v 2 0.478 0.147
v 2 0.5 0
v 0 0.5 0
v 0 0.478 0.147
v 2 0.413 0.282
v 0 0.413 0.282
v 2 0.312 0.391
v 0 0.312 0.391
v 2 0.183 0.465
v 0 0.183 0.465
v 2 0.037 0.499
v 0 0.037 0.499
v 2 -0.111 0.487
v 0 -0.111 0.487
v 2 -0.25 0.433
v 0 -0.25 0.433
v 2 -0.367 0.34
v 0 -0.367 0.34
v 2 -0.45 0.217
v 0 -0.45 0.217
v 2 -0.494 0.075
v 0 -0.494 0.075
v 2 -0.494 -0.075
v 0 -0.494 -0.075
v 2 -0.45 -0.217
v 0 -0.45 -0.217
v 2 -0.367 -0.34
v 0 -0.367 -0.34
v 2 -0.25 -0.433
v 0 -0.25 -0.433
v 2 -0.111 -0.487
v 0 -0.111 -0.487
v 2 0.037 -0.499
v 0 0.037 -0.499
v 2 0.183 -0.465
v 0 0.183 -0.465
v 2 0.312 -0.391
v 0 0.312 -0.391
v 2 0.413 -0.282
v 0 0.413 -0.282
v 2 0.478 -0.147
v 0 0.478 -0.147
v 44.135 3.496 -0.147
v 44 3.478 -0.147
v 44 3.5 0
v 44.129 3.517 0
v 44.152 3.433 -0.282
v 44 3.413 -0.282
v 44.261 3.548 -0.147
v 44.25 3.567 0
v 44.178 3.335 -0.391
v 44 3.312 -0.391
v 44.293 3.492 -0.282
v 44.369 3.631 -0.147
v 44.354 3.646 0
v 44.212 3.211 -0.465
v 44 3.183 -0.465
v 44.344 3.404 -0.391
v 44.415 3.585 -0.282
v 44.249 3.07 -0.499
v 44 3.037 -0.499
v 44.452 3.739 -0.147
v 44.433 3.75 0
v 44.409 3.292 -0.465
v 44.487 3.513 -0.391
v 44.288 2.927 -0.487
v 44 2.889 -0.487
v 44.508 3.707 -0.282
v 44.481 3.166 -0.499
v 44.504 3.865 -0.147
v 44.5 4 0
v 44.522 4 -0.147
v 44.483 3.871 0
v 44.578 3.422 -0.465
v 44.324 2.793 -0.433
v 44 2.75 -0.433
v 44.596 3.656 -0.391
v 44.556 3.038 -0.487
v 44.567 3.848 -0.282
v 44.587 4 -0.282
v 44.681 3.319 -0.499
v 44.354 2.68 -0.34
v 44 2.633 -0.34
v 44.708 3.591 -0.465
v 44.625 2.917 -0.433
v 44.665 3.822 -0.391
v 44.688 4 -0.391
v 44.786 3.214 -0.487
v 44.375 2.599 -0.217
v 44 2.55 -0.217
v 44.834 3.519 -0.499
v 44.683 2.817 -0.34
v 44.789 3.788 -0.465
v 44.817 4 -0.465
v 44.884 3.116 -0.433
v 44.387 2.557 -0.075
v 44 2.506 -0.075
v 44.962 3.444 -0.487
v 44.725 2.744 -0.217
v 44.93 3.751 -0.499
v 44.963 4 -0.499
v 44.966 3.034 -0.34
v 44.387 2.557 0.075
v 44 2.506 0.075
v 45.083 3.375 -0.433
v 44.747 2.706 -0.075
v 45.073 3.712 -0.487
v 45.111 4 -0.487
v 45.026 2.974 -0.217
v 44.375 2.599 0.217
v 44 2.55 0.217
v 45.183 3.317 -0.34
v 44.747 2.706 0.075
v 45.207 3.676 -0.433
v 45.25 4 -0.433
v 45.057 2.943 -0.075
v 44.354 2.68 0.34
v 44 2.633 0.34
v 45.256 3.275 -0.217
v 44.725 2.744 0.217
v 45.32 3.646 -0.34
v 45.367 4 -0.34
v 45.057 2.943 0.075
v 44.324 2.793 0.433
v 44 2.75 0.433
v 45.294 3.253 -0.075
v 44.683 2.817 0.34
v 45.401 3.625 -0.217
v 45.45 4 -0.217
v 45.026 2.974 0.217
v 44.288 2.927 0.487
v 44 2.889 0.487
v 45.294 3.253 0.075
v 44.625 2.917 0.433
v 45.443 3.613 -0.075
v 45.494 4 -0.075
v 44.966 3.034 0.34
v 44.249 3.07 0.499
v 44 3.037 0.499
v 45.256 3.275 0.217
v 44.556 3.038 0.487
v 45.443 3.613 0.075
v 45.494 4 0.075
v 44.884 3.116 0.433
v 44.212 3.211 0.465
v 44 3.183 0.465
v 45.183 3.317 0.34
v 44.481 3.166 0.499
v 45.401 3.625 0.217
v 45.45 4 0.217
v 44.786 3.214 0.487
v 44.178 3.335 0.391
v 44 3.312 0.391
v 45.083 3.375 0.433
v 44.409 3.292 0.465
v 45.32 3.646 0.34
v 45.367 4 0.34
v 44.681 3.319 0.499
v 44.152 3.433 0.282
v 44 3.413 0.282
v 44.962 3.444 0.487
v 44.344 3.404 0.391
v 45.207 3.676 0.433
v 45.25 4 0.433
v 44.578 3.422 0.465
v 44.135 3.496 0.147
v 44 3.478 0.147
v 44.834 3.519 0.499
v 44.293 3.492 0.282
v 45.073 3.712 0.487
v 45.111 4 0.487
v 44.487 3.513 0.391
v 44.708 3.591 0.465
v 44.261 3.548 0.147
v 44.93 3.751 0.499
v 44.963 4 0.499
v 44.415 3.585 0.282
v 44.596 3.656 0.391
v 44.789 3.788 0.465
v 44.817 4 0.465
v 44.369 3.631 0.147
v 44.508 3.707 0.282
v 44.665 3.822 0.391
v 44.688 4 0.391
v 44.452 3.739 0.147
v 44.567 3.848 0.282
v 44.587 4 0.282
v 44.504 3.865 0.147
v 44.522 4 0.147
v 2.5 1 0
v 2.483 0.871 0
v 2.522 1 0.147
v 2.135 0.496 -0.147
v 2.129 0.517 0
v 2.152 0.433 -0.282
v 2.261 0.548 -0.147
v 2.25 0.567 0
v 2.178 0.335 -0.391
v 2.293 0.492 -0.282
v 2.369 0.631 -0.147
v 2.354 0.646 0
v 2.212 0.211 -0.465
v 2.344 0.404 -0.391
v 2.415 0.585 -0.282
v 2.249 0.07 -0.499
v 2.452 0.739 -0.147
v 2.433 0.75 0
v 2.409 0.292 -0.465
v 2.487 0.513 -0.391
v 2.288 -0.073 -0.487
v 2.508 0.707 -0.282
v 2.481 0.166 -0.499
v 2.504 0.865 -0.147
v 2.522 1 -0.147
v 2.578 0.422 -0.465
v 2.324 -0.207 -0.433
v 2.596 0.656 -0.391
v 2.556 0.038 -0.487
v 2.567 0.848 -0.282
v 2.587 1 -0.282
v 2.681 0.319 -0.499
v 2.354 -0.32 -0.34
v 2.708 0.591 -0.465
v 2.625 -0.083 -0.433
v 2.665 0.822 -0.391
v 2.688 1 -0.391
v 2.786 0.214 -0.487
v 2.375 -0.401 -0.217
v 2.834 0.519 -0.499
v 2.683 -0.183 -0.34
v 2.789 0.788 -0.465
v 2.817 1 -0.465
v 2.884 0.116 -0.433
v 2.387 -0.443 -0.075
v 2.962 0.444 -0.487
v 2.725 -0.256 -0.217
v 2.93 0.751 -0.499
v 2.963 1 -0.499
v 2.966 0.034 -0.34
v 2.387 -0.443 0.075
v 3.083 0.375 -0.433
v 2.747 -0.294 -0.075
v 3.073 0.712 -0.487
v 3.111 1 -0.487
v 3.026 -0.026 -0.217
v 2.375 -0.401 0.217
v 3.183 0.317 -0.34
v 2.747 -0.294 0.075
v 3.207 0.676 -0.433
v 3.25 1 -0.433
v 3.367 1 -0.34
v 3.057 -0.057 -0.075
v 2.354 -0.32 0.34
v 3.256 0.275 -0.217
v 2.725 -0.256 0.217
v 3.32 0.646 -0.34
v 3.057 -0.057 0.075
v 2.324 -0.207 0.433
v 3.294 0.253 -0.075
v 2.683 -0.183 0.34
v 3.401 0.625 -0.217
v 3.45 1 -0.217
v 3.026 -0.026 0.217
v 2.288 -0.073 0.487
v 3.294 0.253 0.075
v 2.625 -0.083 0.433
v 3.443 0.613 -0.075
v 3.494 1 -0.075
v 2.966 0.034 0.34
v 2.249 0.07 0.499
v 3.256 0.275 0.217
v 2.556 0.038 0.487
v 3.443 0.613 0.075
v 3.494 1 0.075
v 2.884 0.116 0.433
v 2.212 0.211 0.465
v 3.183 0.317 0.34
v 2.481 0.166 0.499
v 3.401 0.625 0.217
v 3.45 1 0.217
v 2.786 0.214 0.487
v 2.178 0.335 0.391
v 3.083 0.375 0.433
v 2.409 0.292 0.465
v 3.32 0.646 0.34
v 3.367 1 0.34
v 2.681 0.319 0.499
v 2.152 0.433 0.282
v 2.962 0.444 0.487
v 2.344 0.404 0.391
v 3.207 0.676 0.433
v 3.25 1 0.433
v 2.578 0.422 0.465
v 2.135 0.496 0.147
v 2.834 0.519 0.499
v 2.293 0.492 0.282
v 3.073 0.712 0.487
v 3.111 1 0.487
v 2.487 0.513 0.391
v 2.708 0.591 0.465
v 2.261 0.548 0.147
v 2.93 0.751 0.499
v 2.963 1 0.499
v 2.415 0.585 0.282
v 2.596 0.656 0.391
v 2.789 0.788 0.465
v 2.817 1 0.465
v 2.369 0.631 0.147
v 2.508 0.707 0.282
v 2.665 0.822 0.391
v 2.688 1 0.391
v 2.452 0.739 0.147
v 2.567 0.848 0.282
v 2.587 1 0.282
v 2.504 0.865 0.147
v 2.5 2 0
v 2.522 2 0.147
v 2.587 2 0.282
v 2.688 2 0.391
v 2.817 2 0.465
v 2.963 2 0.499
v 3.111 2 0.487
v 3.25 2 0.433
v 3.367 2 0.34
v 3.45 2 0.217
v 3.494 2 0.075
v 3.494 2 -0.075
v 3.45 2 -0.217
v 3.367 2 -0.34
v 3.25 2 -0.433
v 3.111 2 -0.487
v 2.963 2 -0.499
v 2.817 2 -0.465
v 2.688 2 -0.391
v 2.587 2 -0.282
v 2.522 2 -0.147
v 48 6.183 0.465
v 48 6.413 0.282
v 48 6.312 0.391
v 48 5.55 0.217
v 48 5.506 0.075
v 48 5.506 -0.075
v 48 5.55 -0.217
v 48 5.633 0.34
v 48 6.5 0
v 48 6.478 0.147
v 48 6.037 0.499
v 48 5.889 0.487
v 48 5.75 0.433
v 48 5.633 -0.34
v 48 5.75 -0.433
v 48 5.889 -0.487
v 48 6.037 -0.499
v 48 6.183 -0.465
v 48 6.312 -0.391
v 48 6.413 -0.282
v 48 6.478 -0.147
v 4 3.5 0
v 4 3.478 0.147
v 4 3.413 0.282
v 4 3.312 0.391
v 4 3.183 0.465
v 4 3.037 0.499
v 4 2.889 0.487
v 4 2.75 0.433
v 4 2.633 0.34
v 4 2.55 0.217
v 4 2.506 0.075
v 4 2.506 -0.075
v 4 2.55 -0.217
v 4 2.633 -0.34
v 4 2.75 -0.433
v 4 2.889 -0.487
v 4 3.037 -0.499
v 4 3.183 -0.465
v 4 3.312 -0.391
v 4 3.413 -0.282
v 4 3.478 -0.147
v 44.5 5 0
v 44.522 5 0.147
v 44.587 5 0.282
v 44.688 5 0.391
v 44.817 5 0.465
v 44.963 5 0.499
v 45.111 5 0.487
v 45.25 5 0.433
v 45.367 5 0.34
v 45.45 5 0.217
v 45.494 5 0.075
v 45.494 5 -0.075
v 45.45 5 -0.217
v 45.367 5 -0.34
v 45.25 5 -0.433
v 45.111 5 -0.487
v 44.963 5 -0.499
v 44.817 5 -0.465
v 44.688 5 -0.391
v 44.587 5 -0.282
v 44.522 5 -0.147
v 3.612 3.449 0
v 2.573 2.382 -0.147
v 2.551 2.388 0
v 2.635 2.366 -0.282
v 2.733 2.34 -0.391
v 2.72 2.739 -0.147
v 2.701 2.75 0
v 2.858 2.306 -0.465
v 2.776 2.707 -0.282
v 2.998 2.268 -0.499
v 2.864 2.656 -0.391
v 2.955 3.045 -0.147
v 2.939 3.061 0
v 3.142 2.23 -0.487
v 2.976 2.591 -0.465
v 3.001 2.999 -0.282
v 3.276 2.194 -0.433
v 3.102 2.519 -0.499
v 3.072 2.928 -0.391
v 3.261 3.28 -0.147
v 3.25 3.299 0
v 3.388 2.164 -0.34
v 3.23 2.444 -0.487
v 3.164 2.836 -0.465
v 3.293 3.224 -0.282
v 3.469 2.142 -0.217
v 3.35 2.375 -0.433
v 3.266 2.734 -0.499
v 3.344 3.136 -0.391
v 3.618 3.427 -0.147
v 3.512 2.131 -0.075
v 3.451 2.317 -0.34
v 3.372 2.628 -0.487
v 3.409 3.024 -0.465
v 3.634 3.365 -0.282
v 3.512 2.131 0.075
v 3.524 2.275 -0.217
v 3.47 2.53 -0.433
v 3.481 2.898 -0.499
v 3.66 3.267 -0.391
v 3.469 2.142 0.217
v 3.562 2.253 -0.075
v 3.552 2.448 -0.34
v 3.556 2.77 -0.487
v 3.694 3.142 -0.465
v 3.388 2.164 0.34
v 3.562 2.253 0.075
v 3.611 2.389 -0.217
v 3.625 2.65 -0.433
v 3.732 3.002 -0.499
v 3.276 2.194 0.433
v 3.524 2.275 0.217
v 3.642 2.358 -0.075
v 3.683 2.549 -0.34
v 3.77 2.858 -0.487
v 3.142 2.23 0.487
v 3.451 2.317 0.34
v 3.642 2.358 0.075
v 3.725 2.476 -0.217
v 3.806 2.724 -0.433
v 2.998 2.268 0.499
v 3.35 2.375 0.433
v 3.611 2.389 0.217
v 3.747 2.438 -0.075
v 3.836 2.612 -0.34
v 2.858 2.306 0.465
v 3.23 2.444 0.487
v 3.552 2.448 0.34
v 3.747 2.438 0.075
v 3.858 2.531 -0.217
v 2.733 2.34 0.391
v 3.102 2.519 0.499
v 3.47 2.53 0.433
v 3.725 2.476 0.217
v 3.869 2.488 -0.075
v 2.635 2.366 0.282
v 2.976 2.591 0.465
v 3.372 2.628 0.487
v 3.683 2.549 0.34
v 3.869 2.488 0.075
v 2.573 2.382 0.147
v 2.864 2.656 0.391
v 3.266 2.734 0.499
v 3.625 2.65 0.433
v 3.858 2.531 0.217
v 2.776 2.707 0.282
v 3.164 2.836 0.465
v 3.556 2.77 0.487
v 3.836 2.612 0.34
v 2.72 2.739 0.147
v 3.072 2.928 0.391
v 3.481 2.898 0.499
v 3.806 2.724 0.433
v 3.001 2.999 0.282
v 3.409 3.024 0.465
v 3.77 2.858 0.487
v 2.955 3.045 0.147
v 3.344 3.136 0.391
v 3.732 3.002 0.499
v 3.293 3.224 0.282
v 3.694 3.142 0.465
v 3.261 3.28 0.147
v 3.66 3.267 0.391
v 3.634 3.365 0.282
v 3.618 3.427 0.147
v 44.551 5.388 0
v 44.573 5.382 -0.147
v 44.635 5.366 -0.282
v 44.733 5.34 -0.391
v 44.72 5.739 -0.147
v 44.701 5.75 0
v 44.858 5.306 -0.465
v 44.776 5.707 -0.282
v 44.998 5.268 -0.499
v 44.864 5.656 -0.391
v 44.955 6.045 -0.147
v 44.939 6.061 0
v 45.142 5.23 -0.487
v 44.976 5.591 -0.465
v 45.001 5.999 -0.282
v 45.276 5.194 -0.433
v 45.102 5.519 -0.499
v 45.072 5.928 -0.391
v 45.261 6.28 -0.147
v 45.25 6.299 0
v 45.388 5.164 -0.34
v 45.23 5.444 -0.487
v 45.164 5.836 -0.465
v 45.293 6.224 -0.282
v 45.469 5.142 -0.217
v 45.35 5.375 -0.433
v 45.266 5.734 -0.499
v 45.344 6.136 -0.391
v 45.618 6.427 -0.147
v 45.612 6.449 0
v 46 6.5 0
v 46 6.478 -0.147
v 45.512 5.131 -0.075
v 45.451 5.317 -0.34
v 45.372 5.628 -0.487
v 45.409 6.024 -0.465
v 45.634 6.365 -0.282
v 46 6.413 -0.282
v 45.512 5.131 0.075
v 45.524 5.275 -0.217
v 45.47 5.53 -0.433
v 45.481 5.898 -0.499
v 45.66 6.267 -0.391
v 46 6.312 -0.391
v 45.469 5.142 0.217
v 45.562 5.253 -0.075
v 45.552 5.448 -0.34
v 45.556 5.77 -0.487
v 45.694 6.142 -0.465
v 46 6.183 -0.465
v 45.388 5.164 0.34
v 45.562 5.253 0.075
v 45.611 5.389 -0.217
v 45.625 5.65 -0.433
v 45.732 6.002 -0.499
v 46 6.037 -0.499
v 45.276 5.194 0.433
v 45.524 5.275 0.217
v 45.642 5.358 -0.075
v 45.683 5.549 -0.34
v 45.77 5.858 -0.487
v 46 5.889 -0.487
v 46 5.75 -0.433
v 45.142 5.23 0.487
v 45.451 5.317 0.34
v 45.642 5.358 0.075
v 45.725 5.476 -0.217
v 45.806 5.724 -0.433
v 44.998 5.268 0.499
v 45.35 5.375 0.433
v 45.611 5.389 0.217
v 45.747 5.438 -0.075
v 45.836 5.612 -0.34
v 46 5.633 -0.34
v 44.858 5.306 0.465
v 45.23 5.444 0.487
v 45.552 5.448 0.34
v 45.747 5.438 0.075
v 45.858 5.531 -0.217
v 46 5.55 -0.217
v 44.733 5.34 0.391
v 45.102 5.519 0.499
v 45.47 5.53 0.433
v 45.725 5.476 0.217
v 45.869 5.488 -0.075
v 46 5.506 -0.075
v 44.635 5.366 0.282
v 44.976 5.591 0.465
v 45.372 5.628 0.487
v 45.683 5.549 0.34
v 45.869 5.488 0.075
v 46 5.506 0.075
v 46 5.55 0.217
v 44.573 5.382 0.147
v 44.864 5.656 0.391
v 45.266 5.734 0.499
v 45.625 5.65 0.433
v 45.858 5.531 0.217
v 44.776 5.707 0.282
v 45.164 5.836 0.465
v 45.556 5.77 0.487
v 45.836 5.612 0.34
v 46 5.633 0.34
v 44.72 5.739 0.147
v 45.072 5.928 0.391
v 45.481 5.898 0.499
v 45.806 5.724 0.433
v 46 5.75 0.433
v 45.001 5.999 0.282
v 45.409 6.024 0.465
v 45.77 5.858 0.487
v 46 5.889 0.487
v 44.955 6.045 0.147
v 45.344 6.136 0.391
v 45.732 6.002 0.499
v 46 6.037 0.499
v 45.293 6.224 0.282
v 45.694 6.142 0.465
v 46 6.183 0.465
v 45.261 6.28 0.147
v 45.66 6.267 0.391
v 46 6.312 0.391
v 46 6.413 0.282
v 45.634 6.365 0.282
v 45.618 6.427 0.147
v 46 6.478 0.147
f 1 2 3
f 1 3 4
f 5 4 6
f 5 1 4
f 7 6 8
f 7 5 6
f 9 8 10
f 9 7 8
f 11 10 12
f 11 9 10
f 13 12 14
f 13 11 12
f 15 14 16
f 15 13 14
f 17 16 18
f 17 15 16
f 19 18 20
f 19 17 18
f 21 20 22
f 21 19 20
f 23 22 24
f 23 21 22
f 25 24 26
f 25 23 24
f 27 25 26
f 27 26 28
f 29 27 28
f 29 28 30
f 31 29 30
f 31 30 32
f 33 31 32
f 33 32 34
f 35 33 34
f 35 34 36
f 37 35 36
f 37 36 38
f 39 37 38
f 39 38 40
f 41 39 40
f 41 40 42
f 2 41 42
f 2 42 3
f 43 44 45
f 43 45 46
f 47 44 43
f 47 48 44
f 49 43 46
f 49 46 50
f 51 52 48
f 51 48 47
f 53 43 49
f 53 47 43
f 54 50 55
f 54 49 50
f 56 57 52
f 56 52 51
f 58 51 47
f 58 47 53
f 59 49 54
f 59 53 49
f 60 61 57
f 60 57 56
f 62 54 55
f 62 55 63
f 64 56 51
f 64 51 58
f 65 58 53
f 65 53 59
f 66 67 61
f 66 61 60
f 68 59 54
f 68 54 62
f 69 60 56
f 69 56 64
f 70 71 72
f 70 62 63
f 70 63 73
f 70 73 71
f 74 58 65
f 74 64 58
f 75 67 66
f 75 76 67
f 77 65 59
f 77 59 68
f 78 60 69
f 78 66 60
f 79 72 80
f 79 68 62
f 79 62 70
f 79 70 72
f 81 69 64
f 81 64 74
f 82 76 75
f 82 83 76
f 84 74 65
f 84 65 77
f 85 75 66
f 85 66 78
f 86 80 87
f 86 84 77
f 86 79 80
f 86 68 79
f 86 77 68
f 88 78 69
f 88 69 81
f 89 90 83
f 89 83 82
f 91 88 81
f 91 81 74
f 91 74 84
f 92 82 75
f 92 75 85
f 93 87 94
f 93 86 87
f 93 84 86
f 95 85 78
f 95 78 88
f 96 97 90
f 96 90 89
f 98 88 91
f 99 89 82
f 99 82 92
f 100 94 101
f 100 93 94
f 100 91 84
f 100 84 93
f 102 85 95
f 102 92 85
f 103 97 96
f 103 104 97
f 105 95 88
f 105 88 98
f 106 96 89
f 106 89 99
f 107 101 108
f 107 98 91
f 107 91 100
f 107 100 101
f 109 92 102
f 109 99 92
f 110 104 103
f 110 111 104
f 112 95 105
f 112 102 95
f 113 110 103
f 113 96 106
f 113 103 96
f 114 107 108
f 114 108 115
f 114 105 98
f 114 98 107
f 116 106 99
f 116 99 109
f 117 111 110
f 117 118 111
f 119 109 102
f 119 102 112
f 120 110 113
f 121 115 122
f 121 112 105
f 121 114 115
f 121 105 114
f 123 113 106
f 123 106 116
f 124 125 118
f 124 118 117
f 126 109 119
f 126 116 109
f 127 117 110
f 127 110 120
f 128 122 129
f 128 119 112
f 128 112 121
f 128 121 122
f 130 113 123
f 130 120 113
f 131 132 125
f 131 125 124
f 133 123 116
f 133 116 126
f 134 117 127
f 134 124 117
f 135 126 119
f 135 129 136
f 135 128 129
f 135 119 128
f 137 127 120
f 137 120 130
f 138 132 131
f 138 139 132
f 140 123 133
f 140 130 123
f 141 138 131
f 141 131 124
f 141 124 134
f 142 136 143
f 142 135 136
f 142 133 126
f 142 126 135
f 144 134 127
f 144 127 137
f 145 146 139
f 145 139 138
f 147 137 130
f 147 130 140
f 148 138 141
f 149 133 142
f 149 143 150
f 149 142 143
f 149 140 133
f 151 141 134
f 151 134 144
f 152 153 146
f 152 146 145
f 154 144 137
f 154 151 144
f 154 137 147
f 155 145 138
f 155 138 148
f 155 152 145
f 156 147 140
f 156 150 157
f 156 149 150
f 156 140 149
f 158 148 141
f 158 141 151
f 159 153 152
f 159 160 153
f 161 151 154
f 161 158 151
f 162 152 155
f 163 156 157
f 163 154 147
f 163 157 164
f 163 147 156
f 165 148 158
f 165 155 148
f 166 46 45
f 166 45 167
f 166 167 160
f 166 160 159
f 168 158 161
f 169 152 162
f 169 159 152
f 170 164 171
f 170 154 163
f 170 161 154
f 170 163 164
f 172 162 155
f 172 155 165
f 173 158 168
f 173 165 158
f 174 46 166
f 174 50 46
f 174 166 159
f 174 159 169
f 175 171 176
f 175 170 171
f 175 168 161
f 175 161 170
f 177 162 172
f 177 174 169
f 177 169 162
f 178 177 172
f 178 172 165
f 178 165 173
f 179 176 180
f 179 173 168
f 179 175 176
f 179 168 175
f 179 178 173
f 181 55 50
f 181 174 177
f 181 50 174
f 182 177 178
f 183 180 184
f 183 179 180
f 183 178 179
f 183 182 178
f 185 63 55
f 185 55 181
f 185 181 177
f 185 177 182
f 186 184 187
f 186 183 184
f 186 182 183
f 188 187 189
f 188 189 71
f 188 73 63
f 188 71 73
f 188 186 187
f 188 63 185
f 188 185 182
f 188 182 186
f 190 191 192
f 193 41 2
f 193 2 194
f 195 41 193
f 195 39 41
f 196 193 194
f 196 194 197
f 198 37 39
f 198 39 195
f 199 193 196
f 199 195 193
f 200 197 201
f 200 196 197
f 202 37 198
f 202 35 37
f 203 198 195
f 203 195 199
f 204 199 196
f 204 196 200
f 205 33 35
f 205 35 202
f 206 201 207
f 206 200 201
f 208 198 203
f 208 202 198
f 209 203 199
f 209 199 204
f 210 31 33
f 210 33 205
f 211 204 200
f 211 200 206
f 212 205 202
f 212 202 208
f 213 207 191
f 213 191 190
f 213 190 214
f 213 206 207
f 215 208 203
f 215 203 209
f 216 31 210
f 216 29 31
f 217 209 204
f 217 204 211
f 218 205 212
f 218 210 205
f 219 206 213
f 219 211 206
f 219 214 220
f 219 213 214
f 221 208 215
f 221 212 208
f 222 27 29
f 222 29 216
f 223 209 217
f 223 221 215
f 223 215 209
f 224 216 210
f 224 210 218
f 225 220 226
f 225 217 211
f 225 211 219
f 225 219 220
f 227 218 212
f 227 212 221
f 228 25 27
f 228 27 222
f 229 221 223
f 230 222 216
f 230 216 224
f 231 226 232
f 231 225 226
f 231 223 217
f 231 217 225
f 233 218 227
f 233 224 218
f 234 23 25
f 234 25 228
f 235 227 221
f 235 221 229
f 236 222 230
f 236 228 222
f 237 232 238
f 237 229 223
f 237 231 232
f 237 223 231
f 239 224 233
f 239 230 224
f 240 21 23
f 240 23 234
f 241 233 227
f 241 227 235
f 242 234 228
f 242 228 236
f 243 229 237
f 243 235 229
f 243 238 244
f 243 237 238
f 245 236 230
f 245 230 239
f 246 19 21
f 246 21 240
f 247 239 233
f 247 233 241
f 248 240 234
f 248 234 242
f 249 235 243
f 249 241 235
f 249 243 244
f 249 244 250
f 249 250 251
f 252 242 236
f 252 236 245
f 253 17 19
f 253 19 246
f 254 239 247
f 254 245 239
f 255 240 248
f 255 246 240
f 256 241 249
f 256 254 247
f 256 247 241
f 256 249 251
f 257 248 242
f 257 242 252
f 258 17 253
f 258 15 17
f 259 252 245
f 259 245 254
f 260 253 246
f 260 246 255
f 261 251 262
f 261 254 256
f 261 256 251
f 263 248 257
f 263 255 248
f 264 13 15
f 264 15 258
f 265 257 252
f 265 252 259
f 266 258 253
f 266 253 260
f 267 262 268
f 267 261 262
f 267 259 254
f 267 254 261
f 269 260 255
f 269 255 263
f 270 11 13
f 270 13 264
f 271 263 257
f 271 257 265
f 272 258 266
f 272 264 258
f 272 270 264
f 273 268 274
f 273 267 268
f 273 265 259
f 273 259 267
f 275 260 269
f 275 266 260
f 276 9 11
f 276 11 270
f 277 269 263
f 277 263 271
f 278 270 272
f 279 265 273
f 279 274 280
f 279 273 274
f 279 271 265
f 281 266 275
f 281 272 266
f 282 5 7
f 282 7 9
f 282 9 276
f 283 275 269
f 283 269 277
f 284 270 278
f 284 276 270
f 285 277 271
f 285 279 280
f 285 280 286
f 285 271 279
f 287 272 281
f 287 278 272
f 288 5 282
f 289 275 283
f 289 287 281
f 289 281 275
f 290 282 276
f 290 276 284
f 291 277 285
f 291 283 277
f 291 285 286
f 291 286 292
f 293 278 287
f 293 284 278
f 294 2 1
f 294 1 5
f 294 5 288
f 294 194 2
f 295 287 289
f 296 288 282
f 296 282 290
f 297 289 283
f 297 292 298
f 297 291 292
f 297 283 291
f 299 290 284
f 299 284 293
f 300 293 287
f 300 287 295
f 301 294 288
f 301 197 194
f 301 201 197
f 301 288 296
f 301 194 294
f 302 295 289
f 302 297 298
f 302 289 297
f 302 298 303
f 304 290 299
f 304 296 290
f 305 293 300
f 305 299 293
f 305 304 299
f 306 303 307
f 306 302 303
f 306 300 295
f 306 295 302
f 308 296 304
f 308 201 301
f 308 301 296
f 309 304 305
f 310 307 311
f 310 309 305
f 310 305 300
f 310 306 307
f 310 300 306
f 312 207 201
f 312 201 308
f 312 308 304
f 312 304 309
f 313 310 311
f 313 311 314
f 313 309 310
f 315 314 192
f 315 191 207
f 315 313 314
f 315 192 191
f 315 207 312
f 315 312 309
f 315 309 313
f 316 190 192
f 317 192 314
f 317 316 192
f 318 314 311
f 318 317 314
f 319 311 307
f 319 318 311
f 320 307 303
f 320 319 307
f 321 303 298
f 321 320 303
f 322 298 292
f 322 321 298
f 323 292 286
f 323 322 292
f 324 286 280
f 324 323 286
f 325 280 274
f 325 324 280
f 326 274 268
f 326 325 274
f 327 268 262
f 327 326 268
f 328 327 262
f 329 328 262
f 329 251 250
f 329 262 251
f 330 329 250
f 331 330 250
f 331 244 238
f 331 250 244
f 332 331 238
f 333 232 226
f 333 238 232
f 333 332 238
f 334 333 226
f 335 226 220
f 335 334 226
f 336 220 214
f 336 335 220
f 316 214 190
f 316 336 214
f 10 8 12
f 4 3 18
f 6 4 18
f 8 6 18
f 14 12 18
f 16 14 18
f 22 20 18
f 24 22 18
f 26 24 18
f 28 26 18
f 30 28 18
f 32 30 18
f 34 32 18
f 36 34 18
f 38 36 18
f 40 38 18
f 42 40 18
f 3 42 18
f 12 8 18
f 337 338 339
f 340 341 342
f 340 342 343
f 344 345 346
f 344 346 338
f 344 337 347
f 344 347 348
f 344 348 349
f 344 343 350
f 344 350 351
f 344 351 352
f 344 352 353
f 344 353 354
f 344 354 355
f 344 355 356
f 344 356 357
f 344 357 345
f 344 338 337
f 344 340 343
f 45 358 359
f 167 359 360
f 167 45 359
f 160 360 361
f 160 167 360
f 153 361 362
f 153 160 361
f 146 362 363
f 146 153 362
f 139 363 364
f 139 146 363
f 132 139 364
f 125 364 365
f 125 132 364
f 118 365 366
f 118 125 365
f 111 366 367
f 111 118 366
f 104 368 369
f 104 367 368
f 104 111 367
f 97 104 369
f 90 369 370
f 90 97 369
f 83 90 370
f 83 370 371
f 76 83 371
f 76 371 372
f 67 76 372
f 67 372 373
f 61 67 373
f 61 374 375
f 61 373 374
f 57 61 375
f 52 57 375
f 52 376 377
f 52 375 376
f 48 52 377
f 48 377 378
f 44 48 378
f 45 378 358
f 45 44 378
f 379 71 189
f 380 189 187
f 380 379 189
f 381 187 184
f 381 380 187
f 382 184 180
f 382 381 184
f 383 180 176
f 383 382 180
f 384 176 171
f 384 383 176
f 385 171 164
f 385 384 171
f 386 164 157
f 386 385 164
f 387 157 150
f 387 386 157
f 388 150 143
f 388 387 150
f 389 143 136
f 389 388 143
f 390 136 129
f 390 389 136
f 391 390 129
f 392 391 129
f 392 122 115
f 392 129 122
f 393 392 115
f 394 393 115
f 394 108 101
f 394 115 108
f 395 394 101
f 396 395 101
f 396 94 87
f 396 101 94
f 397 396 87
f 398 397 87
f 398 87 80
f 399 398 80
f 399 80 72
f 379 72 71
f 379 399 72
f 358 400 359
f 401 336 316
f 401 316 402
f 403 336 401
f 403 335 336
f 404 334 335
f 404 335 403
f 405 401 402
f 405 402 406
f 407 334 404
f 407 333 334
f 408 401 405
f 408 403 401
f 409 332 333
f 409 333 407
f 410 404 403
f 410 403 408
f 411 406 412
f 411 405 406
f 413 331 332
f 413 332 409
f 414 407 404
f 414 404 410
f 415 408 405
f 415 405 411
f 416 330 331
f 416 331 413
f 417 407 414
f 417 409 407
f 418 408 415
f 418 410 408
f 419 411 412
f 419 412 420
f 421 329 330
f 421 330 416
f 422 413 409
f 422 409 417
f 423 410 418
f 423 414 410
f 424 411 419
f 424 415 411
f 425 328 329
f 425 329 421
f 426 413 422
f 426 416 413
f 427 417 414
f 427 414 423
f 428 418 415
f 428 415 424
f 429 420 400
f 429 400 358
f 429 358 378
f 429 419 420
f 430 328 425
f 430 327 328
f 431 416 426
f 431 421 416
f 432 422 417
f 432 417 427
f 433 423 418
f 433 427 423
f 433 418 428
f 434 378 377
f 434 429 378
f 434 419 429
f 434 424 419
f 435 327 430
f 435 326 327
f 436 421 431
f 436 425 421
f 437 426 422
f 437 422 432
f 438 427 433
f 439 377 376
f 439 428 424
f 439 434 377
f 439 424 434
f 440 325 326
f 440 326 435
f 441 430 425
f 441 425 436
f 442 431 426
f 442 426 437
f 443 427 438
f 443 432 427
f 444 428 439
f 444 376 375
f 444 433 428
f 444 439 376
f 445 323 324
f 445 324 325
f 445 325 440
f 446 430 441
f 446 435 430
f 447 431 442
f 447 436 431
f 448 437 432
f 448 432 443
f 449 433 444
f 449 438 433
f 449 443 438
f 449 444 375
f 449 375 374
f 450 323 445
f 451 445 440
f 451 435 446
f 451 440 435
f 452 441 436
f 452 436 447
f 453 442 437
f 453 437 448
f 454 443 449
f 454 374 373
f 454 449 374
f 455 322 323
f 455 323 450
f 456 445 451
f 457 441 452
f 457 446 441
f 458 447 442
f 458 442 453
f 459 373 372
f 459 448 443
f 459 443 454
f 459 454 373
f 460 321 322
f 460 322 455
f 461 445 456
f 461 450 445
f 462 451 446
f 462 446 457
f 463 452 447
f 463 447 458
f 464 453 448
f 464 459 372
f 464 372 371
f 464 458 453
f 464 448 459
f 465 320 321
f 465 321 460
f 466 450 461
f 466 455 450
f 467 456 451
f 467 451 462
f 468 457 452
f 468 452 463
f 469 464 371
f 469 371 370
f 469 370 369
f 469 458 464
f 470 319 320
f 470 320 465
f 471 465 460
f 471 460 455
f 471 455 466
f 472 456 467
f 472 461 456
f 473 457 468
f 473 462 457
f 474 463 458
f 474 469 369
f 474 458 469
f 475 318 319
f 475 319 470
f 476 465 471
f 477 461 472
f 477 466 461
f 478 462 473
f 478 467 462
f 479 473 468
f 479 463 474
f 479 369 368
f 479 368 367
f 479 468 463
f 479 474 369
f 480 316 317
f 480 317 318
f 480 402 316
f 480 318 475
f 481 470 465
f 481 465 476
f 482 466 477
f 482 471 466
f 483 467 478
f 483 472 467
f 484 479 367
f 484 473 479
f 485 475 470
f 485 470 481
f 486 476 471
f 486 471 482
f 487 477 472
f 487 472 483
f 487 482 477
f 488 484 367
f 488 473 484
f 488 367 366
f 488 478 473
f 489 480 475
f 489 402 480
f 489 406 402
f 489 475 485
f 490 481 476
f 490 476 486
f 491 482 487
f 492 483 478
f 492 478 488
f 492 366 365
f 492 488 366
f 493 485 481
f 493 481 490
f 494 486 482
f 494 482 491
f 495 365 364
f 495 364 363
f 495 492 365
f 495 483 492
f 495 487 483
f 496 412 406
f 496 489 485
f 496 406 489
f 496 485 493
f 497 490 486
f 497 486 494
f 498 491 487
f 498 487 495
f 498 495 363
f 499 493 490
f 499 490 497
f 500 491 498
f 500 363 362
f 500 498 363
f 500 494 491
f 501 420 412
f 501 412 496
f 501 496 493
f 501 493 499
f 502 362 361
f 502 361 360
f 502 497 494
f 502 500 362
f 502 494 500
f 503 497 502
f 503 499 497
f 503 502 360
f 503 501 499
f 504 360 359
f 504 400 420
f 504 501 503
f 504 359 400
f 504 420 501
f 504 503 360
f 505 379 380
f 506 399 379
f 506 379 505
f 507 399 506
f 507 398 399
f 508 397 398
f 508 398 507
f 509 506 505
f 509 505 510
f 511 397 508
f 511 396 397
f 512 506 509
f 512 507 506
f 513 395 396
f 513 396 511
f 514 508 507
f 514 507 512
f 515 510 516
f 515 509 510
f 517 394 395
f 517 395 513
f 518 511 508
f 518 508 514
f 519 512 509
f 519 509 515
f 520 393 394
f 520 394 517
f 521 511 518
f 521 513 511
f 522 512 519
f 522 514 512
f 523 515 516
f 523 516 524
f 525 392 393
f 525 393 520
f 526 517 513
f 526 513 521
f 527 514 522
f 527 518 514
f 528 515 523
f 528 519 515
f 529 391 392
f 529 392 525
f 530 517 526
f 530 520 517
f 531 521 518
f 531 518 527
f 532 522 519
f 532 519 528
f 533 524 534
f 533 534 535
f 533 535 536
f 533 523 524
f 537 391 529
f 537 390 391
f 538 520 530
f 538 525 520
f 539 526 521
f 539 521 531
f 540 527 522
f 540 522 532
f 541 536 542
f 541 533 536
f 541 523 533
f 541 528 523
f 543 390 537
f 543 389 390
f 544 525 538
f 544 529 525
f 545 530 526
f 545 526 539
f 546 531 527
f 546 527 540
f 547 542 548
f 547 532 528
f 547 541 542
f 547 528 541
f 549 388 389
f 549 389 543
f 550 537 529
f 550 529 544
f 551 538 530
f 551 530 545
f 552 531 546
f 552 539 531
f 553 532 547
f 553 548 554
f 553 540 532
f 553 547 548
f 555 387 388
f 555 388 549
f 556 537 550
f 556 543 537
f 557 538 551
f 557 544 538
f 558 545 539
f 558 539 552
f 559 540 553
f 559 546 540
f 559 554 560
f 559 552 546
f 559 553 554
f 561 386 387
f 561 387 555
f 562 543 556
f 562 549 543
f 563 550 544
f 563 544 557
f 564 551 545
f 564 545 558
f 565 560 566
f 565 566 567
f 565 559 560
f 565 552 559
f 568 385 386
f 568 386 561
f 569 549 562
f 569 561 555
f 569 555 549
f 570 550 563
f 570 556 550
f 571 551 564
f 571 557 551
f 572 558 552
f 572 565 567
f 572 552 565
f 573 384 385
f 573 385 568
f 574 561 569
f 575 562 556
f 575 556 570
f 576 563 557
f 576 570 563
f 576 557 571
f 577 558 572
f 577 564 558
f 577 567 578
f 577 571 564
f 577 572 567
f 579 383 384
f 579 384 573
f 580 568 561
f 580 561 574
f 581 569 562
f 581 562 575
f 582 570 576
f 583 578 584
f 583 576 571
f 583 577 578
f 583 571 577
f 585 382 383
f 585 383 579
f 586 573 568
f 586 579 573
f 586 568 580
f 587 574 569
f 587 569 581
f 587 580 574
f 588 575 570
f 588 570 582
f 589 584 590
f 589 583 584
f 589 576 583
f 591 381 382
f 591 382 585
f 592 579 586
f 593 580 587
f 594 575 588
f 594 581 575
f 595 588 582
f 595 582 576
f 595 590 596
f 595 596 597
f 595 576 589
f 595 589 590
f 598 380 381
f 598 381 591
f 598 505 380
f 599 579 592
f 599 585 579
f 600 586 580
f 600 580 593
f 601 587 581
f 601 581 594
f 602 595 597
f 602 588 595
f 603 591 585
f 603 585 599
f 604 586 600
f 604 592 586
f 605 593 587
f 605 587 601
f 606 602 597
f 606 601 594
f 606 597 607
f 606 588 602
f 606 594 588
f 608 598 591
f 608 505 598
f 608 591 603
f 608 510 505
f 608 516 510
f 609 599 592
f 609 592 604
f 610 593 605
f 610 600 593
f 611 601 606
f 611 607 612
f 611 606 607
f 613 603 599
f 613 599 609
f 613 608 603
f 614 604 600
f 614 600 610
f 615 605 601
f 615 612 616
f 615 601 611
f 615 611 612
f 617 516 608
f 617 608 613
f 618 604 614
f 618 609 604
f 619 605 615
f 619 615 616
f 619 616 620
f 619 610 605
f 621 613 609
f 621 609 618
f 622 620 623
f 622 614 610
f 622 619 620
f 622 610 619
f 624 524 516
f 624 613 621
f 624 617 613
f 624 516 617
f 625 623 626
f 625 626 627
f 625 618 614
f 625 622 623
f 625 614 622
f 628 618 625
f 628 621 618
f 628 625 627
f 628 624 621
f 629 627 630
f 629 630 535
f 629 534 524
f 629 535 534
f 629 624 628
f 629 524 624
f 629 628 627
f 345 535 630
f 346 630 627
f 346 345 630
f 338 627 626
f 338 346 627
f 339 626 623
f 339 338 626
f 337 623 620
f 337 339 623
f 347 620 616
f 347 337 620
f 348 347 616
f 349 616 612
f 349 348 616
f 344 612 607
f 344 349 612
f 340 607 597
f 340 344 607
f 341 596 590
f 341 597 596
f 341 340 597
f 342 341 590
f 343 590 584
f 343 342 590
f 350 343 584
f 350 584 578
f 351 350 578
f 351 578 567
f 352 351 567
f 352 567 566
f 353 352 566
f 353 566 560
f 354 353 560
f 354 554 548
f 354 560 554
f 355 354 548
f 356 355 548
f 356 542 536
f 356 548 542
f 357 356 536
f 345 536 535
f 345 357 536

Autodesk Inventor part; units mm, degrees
ref_plane "YZ Plane" through (0, 0, 0) normal (1, 0, 0) x (0, 1, 0)
ref_plane "XZ Plane" through (0, 0, 0) normal (0, 1, 0) x (-1, 0, 0)
ref_plane "XY Plane" through (0, 0, 0) normal (0, 0, 1) x (1, 0, 0)
sketch "Skizze1" plane through (0, 0, 0) normal (0, 0, 1) x (1, 0, 0)
  line L0 (0, 0) -> (2, 0)
  line L1 (3, 1) -> (3, 2)
  line L2 (4, 3) -> (44, 3)
  line L3 (45, 4) -> (45, 5)
  line L4 (46, 6) -> (48, 6)
  arc A0 (2, 0) -> (3, 1) centre (2, 1) ccw
  arc A1 (4, 3) -> (3, 2) centre (4, 2) ccw
  arc A2 (44, 3) -> (45, 4) centre (44, 4) ccw
  arc A3 (46, 6) -> (45, 5) centre (46, 5) ccw
  dimension "d0" = 1
  dimension "d4" = 2
  dimension "d5" = 3
  dimension "d6" = 3
  dimension "d7" = 40
  dimension "d8" = 2
sketch "Skizze2" plane through (0, 0, 0) normal (1, 0, 0) x (0, 1, 0)
  circle A0 centre (0, 0) radius 0.5
  dimension "d1" = 1
sweep "Sweeping1" add profiles "Skizze2" path "Skizze1"
properties part number "P_Wing_mid_servolink"
